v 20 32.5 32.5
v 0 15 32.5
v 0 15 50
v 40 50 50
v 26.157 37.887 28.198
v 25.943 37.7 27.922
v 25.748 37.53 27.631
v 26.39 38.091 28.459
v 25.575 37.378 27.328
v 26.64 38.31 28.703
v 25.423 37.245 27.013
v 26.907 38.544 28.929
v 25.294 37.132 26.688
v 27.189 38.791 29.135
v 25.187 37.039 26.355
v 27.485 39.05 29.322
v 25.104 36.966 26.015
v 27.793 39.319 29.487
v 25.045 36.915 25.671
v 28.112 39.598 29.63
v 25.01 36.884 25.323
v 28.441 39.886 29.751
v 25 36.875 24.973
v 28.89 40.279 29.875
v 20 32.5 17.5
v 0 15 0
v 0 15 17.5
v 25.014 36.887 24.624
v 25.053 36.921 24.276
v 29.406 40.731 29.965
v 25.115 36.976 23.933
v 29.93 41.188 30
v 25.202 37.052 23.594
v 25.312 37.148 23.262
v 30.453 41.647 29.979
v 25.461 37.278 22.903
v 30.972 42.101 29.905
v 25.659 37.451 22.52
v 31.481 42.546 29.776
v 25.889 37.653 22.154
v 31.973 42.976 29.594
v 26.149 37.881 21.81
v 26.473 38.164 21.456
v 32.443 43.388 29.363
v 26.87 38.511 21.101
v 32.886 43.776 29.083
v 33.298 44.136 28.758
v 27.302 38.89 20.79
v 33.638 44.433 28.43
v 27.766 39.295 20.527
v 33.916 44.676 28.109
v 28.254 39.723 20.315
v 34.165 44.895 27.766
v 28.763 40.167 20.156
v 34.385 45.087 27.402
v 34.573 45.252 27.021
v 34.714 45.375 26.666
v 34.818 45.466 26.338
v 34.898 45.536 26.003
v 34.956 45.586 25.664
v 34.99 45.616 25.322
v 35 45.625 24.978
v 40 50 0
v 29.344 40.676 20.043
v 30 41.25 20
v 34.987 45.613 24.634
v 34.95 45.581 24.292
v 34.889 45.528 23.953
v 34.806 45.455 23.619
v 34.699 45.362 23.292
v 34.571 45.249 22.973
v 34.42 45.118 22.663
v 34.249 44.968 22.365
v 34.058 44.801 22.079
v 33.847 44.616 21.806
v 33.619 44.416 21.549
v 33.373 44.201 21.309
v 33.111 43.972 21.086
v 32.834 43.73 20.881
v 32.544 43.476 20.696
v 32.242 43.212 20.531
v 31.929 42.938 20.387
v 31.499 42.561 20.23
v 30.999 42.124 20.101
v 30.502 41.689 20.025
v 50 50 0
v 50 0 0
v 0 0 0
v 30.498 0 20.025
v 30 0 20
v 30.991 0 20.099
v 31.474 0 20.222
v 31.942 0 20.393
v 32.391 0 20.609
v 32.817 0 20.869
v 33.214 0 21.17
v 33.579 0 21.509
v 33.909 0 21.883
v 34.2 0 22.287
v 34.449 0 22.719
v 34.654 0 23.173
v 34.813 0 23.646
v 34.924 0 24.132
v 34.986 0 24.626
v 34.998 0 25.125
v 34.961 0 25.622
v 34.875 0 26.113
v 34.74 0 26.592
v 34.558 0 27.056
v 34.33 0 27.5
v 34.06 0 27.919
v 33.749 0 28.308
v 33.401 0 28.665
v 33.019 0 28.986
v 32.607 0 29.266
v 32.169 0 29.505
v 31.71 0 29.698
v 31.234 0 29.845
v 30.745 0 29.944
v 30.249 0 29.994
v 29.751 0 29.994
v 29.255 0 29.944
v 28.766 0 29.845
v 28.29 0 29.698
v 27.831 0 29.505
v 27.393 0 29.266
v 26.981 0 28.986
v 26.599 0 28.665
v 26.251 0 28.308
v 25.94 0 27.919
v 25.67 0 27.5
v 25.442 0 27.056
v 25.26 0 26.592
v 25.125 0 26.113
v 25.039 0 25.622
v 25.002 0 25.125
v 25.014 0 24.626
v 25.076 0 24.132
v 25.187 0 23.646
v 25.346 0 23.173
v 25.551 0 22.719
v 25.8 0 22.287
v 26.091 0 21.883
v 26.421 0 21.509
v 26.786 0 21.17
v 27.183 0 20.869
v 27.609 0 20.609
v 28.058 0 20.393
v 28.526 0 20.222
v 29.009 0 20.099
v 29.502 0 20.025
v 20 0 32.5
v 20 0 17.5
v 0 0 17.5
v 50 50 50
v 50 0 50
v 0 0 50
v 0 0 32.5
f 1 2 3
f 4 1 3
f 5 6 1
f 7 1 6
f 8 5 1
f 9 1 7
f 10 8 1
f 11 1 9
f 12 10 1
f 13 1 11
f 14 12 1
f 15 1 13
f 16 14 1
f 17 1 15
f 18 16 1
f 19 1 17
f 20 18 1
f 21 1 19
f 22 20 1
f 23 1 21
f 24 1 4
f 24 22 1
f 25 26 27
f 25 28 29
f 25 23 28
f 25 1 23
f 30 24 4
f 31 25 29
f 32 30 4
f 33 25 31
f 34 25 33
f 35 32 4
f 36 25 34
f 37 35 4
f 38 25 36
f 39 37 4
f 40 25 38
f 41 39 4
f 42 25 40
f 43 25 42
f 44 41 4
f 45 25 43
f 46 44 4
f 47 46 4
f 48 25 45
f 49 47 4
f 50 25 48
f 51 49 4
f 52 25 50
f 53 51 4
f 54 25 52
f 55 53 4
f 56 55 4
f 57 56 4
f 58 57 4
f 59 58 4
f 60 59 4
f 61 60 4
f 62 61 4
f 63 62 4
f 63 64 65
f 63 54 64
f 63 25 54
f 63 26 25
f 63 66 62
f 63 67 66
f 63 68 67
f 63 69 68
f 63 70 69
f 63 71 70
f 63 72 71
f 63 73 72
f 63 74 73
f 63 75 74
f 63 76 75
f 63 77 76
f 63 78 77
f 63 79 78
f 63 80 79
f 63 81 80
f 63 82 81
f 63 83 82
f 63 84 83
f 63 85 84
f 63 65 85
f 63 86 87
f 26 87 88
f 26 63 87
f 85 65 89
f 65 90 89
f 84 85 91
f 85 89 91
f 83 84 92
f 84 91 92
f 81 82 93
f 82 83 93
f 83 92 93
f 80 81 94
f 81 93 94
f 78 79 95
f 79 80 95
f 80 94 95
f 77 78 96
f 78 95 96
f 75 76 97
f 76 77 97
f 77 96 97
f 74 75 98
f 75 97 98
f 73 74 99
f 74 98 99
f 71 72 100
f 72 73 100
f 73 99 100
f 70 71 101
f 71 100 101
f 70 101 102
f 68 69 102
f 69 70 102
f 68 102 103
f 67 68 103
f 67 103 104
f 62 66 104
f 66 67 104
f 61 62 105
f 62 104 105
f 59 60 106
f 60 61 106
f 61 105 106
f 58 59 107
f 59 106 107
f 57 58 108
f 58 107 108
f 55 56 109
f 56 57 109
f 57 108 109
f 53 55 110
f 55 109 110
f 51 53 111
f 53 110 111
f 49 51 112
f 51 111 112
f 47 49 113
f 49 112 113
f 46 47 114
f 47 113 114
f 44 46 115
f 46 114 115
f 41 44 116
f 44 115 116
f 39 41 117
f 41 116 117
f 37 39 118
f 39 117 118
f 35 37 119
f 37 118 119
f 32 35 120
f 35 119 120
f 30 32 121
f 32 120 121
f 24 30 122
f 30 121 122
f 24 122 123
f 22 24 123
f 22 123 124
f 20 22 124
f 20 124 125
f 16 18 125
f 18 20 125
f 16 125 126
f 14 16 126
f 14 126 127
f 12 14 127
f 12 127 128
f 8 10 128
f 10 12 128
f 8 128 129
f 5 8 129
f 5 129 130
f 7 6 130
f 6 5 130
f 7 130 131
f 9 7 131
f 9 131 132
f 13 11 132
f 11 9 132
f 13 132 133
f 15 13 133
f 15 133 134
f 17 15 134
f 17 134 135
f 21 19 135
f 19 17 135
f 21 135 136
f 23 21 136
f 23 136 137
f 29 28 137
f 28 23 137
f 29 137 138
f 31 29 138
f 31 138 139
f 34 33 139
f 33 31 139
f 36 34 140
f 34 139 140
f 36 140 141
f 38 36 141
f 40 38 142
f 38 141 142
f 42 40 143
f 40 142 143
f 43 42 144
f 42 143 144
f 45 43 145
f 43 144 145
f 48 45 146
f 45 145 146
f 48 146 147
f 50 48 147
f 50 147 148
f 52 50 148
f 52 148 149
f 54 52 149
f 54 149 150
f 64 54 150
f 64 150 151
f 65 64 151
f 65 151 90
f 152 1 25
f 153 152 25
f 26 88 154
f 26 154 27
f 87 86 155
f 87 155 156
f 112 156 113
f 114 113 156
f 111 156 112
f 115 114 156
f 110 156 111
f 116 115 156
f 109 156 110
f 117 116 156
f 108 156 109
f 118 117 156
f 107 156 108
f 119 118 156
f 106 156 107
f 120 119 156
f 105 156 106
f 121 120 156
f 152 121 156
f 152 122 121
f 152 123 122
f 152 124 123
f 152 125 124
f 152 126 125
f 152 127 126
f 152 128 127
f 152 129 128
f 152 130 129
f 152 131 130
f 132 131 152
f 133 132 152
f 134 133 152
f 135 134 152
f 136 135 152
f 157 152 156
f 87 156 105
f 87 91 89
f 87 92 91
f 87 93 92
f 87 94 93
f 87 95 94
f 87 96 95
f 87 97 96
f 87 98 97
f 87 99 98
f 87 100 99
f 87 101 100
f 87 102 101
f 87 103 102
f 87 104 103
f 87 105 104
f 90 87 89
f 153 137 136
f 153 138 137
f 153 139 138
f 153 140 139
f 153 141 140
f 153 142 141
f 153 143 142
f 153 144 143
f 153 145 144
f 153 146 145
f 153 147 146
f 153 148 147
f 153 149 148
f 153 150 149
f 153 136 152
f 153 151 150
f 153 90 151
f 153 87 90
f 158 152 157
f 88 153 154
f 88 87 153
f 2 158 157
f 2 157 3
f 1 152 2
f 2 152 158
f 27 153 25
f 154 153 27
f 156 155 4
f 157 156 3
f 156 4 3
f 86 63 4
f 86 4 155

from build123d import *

# Parameters (mm, degrees)
BOSS_EXTRUDE1_DEPTH = 50
SKETCH9_R           = 5
CUT_EXTRUDE1_DEPTH  = 87.602540378
SKETCH12_W          = 20
SKETCH12_H          = 15
CUT_EXTRUDE3_DEPTH  = 87.602540378


with BuildPart() as part:
    # Sketch1 → Boss-Extrude1 (new body)
    with BuildSketch(Plane.XY):
        Polygon((0, 0), (0, 15), (40, 50), (50, 50), (50, 0), align=None)
    extrude(amount=BOSS_EXTRUDE1_DEPTH)

    # Sketch9 → Cut-Extrude1 (cut, through all)
    with BuildSketch(Plane(origin=(0, 0, 0), x_dir=(-1, 0, 0), z_dir=(0, -1, 0))):
        with Locations(Location((-30, -25, 0), (0, 0, 90))):
            Circle(SKETCH9_R)
    extrude(amount=-CUT_EXTRUDE1_DEPTH, mode=Mode.SUBTRACT)

    # Sketch12 → Cut-Extrude3 (cut, through all)
    with BuildSketch(Plane(origin=(0, 0, 0), x_dir=(-1, 0, 0), z_dir=(0, -1, 0))):
        with Locations((-10, -25)):
            Rectangle(SKETCH12_W, SKETCH12_H)
    extrude(amount=-CUT_EXTRUDE3_DEPTH, mode=Mode.SUBTRACT)


solid = part.part
